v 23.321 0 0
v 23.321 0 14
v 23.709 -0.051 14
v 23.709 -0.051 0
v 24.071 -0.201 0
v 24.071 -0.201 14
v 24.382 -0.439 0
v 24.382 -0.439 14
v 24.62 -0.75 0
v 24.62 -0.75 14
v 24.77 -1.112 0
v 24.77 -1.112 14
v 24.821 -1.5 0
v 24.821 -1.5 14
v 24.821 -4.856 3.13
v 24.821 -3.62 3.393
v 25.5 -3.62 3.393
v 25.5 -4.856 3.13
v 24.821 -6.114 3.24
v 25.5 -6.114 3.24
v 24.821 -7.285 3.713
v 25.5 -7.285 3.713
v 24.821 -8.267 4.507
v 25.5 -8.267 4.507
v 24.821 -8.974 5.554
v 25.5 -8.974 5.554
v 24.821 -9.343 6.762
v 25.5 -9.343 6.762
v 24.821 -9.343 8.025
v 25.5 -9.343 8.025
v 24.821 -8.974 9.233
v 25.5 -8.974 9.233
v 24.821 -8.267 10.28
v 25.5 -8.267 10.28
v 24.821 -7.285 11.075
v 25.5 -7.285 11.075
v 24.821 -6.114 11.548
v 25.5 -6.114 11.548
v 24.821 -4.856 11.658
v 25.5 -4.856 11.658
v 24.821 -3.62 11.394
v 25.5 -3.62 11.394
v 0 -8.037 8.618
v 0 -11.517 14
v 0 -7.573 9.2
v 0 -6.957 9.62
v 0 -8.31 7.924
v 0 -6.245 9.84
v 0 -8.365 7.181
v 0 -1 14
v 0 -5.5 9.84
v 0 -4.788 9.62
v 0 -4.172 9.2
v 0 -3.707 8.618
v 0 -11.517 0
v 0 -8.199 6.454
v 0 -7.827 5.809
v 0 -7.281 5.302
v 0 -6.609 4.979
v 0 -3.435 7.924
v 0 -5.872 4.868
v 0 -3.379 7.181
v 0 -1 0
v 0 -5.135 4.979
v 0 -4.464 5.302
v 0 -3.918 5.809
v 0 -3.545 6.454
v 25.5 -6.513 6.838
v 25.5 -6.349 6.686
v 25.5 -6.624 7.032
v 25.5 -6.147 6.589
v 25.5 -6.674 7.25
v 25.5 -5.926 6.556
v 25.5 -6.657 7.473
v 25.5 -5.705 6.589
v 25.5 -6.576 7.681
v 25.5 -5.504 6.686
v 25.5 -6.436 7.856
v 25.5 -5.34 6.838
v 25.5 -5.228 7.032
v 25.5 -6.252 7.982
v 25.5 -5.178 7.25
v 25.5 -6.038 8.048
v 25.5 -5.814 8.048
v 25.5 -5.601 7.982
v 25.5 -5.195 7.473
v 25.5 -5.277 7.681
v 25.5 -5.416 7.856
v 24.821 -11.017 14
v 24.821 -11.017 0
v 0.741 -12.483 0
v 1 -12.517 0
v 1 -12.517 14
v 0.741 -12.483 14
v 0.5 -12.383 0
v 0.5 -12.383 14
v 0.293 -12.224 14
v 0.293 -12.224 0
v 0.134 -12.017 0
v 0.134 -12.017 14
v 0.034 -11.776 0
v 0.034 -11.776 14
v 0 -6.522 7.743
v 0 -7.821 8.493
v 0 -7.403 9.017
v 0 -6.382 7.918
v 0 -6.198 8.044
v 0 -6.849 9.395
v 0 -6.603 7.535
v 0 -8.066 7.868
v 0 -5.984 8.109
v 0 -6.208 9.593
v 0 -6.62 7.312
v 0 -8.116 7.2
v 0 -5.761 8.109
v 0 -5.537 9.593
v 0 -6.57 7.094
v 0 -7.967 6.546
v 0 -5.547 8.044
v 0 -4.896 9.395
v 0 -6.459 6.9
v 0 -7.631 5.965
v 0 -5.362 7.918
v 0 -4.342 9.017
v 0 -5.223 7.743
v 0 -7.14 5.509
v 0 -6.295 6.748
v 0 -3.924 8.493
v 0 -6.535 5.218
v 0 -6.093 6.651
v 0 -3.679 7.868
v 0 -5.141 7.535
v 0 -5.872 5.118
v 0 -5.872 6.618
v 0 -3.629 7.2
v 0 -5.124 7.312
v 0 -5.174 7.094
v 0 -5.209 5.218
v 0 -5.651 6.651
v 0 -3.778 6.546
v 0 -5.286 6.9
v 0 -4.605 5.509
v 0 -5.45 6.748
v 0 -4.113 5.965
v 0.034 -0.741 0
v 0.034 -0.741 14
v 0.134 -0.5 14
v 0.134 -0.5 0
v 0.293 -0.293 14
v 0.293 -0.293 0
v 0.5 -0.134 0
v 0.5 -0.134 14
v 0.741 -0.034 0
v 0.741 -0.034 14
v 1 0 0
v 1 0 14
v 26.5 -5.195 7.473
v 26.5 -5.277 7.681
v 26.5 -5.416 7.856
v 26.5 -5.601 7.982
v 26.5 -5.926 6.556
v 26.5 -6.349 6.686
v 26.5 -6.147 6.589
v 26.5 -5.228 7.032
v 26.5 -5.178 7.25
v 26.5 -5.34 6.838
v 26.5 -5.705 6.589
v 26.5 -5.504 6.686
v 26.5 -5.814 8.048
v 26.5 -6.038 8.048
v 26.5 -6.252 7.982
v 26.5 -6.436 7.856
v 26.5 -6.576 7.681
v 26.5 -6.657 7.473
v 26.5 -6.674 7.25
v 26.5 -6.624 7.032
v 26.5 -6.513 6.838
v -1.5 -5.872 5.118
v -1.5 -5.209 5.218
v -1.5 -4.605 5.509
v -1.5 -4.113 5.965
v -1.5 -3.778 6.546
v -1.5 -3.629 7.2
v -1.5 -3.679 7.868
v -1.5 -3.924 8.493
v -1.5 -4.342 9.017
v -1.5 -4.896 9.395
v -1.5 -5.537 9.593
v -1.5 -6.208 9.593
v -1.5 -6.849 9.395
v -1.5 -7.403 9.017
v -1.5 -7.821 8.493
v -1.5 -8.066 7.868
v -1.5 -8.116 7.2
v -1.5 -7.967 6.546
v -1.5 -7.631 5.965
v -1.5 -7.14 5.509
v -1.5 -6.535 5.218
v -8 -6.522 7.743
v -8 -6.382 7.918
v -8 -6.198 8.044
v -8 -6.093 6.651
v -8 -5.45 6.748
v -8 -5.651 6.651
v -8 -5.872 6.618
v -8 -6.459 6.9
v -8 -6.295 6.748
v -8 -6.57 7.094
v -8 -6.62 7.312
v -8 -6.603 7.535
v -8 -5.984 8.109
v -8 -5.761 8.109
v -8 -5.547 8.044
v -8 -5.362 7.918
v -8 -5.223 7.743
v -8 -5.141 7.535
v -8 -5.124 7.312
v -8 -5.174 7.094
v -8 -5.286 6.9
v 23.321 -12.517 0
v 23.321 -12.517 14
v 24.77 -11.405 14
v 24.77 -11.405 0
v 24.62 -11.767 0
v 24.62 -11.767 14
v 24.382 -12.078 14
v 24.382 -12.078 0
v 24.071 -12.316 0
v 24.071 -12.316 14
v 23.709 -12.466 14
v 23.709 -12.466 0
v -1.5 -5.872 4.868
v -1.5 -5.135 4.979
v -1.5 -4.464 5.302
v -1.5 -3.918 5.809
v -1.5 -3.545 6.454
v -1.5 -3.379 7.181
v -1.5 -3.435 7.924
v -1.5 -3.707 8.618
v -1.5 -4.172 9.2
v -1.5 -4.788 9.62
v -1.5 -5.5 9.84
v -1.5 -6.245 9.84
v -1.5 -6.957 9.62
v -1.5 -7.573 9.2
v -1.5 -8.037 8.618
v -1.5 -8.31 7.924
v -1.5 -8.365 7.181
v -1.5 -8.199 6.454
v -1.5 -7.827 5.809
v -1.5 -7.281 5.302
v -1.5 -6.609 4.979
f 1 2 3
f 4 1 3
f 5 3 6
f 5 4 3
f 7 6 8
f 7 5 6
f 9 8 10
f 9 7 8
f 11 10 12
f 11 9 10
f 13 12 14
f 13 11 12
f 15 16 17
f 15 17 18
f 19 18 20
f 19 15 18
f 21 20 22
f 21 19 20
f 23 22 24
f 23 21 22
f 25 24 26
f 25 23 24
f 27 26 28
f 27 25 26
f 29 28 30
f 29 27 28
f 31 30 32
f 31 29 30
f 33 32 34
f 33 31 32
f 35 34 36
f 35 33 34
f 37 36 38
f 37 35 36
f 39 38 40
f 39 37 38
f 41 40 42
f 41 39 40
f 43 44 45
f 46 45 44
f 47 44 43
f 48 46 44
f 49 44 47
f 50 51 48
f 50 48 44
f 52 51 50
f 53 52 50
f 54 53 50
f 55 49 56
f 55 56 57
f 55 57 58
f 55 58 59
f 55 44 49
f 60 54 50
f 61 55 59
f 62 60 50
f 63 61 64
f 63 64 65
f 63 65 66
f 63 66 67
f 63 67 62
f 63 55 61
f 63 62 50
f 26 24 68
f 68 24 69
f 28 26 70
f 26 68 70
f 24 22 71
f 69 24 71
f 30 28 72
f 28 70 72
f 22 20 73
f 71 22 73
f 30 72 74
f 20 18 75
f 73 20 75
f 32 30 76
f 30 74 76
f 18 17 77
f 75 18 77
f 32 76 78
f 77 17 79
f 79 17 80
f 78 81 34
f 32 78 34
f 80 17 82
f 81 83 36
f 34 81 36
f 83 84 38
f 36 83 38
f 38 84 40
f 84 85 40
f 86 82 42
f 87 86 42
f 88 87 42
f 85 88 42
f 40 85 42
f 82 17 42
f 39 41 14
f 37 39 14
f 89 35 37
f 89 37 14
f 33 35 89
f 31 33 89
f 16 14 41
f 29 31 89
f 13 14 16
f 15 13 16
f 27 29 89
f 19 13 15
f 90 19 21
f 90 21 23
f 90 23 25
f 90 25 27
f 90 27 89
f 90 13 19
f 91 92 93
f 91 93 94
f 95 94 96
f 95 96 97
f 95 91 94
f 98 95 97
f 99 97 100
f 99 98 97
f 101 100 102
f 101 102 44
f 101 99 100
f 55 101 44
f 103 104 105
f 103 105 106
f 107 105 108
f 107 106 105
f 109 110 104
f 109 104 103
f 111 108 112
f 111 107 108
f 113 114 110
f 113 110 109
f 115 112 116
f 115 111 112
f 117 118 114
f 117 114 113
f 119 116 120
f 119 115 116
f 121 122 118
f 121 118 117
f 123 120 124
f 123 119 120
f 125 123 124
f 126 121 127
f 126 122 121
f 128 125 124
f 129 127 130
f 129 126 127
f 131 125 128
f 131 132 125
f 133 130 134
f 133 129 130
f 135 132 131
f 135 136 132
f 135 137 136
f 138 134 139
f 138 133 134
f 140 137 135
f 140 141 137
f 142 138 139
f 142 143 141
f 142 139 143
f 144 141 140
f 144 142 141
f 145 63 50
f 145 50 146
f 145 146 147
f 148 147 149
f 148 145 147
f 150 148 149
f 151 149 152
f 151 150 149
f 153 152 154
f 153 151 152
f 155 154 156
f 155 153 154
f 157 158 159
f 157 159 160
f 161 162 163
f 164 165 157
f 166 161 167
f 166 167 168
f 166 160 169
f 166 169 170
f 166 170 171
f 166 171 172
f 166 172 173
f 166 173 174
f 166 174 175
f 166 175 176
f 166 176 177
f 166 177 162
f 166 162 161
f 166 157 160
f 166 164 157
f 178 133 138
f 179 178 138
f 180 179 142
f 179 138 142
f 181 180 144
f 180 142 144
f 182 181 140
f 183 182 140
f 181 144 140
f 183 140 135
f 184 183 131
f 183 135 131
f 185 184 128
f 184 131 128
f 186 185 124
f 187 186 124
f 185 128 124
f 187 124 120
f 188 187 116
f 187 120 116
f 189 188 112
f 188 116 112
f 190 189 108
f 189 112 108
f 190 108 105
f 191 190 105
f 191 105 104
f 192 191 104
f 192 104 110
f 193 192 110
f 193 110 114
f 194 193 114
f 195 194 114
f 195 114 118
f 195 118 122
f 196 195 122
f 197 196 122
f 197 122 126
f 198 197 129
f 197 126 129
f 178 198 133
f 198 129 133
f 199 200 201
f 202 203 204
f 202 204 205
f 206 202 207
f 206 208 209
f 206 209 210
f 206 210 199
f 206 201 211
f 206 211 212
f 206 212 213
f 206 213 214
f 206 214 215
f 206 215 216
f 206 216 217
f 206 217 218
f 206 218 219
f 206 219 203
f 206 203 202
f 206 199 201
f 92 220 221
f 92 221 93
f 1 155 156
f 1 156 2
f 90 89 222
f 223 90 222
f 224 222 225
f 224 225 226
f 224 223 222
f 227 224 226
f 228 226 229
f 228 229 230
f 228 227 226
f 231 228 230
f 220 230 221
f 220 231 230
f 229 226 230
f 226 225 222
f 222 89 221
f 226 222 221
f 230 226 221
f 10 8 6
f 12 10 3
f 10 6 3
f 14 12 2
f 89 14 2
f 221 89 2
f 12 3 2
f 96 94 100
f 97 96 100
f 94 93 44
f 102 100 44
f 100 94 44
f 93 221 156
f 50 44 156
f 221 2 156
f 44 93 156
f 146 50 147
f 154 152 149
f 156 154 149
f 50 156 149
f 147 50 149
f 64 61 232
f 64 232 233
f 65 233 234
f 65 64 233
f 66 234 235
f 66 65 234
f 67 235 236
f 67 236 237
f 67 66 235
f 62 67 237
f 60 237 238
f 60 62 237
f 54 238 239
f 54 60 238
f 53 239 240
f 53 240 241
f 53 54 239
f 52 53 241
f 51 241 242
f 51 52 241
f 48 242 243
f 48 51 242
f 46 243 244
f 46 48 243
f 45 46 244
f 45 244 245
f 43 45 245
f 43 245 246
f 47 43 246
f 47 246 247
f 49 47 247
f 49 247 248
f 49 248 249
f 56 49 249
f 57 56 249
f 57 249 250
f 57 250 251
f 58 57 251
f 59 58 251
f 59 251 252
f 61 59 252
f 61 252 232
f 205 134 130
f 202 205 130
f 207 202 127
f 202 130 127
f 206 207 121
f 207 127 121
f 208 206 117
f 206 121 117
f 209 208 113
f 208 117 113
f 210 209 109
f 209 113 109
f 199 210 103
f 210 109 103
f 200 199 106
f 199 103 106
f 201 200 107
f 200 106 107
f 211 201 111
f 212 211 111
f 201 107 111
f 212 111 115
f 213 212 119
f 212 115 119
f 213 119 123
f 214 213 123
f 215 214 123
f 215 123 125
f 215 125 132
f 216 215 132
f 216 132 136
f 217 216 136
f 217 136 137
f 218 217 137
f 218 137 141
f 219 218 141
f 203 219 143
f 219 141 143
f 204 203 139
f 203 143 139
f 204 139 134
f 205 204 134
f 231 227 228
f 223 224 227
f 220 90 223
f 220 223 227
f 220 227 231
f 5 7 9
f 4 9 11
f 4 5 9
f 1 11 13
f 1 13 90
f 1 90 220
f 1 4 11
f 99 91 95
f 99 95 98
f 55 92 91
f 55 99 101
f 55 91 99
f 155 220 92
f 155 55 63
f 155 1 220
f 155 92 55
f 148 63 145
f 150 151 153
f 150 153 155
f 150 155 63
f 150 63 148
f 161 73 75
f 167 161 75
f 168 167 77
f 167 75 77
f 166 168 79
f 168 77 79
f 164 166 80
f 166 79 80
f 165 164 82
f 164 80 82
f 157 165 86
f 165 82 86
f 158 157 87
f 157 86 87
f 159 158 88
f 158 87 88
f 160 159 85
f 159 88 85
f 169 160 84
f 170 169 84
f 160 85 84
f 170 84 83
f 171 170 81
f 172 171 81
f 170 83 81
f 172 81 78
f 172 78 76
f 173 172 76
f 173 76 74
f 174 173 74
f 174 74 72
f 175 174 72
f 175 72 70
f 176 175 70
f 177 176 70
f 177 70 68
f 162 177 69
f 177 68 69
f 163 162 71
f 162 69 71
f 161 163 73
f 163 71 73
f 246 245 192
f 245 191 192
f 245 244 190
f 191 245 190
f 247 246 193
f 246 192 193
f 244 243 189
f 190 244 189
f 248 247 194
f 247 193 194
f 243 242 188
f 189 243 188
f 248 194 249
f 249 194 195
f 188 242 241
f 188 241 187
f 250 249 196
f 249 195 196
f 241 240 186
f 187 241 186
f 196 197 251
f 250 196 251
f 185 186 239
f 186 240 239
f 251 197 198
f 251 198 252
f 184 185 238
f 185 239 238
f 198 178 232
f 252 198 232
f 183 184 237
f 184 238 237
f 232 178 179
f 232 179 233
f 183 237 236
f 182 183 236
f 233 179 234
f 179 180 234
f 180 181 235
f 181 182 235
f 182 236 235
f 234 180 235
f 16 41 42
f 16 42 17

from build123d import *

# Parameters (mm, degrees)
BOSS_EXTRUDE1_DEPTH = 14
SKETCH2_R           = 2.5
SKETCH2_R_2         = 2.25
BOSS_EXTRUDE3_DEPTH = 1.5
SKETCH3_R           = 0.75
BOSS_EXTRUDE4_DEPTH = 8
BOSS_EXTRUDE5_DEPTH = 25.5
SKETCH8_R           = 0.75
BOSS_EXTRUDE7_DEPTH = 1
SKETCH9_R           = 0.75
BOSS_EXTRUDE8_DEPTH = 1


with BuildPart() as part:
    # Sketch1 → Boss-Extrude1 (new body)
    with BuildSketch(Plane.XY):
        with BuildLine():
            Line((1, 0), (23.320898327, 0))
            ThreePointArc((23.320898327, 0), (24.381558498, -0.439339828), (24.820898327, -1.5))
            Line((24.820898327, -1.5), (24.820898327, -11.016992716))
            ThreePointArc((24.820898327, -11.016992716), (24.381558498, -12.077652887), (23.320898327, -12.516992716))
            Line((23.320898327, -12.516992716), (1, -12.516992716))
            ThreePointArc((1, -12.516992716), (0.292893219, -12.224099497), (0, -11.516992716))
            Line((0, -11.516992716), (0, -1))
            ThreePointArc((0, -1), (0.292893219, -0.292893219), (1, 0))
        make_face()
    extrude(amount=BOSS_EXTRUDE1_DEPTH)

    # Sketch2 → Boss-Extrude3 (add)
    with BuildSketch(Plane(origin=(0, 0, 0), x_dir=(0, 0, -1), z_dir=(1, 0, 0))):
        with Locations((-7.367821443, -5.872283843)):
            Circle(SKETCH2_R)
        with Locations((-7.367821443, -5.872283843)):
            Circle(SKETCH2_R_2, mode=Mode.SUBTRACT)
    extrude(amount=-BOSS_EXTRUDE3_DEPTH)

    # Sketch3 → Boss-Extrude4 (add)
    with BuildSketch(Plane.ZY):
        with Locations(Location((7.367821443, -5.872283843, 0), (0, 0, 180))):
            Circle(SKETCH3_R)
    extrude(amount=BOSS_EXTRUDE4_DEPTH)

    # Sketch7 → Boss-Extrude5 (add)
    with BuildSketch(Plane(origin=(0, 0, 0), x_dir=(0, 0, -1), z_dir=(1, 0, 0))):
        with BuildLine():
            Line((-11.394447379, -3.62022901), (-3.393359944, -3.62022901))
            ThreePointArc((-3.393359944, -3.62022901), (-7.393903662, -9.38997212), (-11.394447379, -3.62022901))
        make_face()
    extrude(amount=BOSS_EXTRUDE5_DEPTH)

    # Sketch8 → Boss-Extrude7 (add)
    with BuildSketch(Plane(origin=(25.5, 0, 0), x_dir=(0, 0, -1), z_dir=(1, 0, 0))):
        with Locations((-7.348346706, -5.904616391)):
            Circle(SKETCH8_R)
    extrude(amount=-BOSS_EXTRUDE7_DEPTH)

    # Sketch9 → Boss-Extrude8 (add)
    with BuildSketch(Plane(origin=(25.5, 0, 0), x_dir=(0, 0, -1), z_dir=(1, 0, 0))):
        with Locations((-7.305909656, -5.926147043)):
            Circle(SKETCH9_R)
    extrude(amount=BOSS_EXTRUDE8_DEPTH)


solid = part.part
